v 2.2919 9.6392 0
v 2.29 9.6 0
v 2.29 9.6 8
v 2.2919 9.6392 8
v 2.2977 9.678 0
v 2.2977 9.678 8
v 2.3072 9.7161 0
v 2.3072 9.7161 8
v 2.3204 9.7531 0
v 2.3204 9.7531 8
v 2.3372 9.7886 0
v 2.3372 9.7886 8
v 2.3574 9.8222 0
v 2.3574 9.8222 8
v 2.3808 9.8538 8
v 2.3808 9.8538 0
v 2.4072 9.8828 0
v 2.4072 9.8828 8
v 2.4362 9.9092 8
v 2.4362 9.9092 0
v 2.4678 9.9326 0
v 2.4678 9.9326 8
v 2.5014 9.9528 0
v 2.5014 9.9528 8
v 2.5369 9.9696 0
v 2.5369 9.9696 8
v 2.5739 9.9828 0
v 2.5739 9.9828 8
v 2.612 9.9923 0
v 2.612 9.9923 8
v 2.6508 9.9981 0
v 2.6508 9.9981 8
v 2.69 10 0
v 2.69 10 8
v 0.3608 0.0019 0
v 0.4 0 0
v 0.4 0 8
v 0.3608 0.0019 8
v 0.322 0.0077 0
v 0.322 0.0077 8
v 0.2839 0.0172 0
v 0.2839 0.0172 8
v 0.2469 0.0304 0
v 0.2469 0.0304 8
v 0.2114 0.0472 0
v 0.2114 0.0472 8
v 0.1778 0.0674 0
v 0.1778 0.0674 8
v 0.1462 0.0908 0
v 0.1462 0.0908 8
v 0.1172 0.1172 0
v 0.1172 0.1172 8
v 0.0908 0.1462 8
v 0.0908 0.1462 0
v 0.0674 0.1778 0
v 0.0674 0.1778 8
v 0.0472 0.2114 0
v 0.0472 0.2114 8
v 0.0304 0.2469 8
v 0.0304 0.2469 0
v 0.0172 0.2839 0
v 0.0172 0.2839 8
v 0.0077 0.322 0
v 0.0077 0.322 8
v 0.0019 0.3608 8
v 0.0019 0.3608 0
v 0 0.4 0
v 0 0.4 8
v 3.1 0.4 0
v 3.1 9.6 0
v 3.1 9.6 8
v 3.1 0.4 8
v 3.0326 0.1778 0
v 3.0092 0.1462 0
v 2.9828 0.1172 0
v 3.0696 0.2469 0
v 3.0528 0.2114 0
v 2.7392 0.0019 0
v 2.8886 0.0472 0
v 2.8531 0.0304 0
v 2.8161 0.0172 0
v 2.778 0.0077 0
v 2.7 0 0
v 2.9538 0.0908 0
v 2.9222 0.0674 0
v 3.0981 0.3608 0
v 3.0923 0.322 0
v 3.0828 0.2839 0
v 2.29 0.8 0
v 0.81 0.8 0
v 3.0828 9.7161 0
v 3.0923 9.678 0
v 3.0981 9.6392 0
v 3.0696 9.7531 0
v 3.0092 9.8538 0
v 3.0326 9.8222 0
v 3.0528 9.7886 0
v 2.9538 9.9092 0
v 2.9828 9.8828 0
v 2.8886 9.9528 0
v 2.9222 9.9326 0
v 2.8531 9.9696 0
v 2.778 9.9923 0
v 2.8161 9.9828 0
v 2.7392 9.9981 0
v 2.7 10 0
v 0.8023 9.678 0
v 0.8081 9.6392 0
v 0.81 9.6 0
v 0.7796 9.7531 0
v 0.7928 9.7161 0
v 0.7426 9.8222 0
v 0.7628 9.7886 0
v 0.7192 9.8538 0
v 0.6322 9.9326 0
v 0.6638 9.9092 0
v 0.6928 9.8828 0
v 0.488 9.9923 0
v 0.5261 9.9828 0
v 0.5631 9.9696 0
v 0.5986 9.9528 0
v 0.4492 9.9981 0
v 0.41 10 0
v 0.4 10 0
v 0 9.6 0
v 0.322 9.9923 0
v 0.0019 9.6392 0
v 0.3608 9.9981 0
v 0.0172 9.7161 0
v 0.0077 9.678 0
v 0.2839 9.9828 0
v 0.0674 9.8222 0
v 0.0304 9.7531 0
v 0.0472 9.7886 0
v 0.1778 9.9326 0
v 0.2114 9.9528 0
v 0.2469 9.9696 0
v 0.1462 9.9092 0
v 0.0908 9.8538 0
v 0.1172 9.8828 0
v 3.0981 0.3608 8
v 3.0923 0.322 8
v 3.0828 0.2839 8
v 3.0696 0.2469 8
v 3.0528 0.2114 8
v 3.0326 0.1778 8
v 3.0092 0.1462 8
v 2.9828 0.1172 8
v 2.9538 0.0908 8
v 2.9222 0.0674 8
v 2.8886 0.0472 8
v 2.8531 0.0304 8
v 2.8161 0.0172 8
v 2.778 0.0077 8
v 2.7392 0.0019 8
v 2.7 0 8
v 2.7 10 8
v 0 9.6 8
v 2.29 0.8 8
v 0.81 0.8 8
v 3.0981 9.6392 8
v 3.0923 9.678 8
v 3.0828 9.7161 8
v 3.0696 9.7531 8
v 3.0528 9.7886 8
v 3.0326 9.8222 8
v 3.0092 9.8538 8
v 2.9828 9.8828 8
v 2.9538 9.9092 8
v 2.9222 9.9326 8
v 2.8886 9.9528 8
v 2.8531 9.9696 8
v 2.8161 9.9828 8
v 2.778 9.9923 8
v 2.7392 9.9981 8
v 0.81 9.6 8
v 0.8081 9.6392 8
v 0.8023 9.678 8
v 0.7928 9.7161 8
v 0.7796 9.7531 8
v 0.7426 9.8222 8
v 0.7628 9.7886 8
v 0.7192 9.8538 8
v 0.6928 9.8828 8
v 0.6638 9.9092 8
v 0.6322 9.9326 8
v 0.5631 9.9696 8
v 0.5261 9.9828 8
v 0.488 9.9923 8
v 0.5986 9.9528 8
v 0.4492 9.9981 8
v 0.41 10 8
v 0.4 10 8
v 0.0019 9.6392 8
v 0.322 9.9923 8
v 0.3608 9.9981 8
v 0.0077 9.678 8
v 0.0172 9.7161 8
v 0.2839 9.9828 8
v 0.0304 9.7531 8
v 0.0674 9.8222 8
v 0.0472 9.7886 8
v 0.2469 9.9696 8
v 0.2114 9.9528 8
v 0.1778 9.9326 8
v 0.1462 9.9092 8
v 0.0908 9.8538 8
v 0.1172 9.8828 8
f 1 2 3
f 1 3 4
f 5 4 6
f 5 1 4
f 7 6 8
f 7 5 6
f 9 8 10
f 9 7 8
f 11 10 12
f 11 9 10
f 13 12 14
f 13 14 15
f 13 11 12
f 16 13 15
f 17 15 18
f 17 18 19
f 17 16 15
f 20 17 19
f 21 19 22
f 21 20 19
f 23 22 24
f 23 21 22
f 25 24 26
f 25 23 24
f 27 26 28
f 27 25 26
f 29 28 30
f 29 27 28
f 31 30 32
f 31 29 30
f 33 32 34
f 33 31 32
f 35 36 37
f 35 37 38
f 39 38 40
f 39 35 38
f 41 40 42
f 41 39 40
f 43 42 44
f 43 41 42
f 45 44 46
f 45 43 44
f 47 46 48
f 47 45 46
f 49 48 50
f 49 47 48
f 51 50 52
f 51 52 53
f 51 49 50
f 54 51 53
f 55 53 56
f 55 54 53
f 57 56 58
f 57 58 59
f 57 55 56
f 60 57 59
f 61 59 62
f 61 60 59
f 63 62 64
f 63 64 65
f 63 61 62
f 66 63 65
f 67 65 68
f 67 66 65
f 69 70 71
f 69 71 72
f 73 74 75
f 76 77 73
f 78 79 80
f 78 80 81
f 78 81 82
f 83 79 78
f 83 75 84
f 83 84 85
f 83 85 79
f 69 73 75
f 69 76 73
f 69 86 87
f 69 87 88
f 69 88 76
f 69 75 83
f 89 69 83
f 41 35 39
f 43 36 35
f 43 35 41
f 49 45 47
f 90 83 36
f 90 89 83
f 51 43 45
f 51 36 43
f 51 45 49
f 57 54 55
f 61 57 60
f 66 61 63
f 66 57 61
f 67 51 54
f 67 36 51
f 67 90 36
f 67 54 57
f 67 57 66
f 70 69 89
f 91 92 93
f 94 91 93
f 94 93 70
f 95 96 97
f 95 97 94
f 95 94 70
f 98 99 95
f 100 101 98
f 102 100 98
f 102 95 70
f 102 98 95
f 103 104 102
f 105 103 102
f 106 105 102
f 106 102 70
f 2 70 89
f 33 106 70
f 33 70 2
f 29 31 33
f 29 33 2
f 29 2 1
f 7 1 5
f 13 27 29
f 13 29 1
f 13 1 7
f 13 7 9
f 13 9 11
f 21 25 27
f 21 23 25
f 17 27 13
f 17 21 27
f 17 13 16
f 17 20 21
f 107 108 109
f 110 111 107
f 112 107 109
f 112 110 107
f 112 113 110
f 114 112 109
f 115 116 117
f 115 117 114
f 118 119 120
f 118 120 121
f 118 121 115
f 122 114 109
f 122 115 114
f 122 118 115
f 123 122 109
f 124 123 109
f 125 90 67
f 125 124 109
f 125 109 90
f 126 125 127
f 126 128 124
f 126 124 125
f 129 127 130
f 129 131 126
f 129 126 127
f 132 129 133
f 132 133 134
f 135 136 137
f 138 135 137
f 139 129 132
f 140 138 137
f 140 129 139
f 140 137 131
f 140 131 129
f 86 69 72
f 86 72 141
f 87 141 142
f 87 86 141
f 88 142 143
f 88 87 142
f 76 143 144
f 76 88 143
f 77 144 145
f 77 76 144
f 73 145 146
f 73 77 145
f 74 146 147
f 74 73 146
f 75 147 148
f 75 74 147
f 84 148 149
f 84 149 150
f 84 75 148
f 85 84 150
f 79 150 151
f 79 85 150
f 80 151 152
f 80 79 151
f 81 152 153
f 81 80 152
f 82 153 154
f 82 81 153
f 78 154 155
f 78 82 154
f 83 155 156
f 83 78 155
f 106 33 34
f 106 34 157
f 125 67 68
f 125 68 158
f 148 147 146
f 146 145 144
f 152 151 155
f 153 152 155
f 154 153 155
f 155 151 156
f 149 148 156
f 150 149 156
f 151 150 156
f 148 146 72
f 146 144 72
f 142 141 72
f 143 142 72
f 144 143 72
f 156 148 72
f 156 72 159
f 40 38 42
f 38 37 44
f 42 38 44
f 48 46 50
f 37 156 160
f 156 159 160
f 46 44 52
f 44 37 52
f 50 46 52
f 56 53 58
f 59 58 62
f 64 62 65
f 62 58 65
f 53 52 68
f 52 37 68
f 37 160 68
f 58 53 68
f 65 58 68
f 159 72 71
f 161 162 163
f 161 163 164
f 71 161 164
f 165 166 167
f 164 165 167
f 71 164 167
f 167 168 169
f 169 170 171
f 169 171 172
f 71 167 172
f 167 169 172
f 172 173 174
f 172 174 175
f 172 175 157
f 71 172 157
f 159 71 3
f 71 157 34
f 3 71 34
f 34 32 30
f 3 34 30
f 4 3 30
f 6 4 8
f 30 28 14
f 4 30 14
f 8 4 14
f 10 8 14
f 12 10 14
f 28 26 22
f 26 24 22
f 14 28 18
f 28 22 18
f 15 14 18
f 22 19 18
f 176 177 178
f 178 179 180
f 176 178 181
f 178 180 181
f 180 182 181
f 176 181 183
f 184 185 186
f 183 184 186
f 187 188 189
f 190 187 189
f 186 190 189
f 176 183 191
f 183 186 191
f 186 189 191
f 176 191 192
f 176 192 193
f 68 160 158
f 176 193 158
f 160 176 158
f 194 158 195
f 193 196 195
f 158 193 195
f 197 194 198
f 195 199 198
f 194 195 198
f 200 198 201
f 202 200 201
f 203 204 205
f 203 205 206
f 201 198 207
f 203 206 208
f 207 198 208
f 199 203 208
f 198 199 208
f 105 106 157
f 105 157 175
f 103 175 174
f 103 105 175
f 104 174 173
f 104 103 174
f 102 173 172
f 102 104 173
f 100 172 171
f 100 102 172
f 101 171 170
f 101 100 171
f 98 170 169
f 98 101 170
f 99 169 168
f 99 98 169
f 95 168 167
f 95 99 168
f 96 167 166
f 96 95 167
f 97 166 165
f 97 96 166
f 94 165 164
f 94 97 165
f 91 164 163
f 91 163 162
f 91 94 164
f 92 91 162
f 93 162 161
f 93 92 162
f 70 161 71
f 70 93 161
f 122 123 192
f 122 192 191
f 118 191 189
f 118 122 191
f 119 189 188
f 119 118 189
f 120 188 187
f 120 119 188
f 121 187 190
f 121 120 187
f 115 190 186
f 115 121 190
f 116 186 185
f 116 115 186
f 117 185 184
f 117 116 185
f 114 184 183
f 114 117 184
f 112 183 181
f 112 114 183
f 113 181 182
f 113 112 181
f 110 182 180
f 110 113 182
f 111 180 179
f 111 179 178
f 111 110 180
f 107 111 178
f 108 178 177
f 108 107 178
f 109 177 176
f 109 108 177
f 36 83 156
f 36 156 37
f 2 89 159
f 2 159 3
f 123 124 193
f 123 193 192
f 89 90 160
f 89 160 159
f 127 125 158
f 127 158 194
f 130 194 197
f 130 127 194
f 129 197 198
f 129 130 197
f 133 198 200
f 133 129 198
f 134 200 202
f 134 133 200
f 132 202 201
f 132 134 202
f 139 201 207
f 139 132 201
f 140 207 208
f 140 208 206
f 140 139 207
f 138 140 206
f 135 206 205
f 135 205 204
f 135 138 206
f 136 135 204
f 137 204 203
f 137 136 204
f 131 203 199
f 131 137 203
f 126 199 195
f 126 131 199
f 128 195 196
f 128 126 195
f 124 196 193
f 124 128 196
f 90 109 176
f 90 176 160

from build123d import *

# Parameters (mm, degrees)
BOSS_EXTRUDE1_DEPTH = 8


with BuildPart() as part:
    # Sketch1 → Boss-Extrude1 (new body)
    with BuildSketch(Plane.XY):
        with BuildLine():
            Line((2.69, 10), (2.7, 10))
            ThreePointArc((2.7, 10), (2.982842712, 9.882842712), (3.1, 9.6))
            Line((3.1, 9.6), (3.1, 0.4))
            ThreePointArc((3.1, 0.4), (2.982842712, 0.117157288), (2.7, 0))
            Line((2.7, 0), (0.4, 0))
            ThreePointArc((0.4, 0), (0.117157288, 0.117157288), (0, 0.4))
            Line((0, 0.4), (0, 9.6))
            ThreePointArc((0, 9.6), (0.117157288, 9.882842712), (0.4, 10))
            Line((0.4, 10), (0.41, 10))
            ThreePointArc((0.41, 10), (0.692842712, 9.882842712), (0.81, 9.6))
            Line((0.81, 9.6), (0.81, 0.8))
            Line((0.81, 0.8), (2.29, 0.8))
            Line((2.29, 0.8), (2.29, 9.6))
            ThreePointArc((2.29, 9.6), (2.407157288, 9.882842712), (2.69, 10))
        make_face()
    extrude(amount=BOSS_EXTRUDE1_DEPTH)


solid = part.part
